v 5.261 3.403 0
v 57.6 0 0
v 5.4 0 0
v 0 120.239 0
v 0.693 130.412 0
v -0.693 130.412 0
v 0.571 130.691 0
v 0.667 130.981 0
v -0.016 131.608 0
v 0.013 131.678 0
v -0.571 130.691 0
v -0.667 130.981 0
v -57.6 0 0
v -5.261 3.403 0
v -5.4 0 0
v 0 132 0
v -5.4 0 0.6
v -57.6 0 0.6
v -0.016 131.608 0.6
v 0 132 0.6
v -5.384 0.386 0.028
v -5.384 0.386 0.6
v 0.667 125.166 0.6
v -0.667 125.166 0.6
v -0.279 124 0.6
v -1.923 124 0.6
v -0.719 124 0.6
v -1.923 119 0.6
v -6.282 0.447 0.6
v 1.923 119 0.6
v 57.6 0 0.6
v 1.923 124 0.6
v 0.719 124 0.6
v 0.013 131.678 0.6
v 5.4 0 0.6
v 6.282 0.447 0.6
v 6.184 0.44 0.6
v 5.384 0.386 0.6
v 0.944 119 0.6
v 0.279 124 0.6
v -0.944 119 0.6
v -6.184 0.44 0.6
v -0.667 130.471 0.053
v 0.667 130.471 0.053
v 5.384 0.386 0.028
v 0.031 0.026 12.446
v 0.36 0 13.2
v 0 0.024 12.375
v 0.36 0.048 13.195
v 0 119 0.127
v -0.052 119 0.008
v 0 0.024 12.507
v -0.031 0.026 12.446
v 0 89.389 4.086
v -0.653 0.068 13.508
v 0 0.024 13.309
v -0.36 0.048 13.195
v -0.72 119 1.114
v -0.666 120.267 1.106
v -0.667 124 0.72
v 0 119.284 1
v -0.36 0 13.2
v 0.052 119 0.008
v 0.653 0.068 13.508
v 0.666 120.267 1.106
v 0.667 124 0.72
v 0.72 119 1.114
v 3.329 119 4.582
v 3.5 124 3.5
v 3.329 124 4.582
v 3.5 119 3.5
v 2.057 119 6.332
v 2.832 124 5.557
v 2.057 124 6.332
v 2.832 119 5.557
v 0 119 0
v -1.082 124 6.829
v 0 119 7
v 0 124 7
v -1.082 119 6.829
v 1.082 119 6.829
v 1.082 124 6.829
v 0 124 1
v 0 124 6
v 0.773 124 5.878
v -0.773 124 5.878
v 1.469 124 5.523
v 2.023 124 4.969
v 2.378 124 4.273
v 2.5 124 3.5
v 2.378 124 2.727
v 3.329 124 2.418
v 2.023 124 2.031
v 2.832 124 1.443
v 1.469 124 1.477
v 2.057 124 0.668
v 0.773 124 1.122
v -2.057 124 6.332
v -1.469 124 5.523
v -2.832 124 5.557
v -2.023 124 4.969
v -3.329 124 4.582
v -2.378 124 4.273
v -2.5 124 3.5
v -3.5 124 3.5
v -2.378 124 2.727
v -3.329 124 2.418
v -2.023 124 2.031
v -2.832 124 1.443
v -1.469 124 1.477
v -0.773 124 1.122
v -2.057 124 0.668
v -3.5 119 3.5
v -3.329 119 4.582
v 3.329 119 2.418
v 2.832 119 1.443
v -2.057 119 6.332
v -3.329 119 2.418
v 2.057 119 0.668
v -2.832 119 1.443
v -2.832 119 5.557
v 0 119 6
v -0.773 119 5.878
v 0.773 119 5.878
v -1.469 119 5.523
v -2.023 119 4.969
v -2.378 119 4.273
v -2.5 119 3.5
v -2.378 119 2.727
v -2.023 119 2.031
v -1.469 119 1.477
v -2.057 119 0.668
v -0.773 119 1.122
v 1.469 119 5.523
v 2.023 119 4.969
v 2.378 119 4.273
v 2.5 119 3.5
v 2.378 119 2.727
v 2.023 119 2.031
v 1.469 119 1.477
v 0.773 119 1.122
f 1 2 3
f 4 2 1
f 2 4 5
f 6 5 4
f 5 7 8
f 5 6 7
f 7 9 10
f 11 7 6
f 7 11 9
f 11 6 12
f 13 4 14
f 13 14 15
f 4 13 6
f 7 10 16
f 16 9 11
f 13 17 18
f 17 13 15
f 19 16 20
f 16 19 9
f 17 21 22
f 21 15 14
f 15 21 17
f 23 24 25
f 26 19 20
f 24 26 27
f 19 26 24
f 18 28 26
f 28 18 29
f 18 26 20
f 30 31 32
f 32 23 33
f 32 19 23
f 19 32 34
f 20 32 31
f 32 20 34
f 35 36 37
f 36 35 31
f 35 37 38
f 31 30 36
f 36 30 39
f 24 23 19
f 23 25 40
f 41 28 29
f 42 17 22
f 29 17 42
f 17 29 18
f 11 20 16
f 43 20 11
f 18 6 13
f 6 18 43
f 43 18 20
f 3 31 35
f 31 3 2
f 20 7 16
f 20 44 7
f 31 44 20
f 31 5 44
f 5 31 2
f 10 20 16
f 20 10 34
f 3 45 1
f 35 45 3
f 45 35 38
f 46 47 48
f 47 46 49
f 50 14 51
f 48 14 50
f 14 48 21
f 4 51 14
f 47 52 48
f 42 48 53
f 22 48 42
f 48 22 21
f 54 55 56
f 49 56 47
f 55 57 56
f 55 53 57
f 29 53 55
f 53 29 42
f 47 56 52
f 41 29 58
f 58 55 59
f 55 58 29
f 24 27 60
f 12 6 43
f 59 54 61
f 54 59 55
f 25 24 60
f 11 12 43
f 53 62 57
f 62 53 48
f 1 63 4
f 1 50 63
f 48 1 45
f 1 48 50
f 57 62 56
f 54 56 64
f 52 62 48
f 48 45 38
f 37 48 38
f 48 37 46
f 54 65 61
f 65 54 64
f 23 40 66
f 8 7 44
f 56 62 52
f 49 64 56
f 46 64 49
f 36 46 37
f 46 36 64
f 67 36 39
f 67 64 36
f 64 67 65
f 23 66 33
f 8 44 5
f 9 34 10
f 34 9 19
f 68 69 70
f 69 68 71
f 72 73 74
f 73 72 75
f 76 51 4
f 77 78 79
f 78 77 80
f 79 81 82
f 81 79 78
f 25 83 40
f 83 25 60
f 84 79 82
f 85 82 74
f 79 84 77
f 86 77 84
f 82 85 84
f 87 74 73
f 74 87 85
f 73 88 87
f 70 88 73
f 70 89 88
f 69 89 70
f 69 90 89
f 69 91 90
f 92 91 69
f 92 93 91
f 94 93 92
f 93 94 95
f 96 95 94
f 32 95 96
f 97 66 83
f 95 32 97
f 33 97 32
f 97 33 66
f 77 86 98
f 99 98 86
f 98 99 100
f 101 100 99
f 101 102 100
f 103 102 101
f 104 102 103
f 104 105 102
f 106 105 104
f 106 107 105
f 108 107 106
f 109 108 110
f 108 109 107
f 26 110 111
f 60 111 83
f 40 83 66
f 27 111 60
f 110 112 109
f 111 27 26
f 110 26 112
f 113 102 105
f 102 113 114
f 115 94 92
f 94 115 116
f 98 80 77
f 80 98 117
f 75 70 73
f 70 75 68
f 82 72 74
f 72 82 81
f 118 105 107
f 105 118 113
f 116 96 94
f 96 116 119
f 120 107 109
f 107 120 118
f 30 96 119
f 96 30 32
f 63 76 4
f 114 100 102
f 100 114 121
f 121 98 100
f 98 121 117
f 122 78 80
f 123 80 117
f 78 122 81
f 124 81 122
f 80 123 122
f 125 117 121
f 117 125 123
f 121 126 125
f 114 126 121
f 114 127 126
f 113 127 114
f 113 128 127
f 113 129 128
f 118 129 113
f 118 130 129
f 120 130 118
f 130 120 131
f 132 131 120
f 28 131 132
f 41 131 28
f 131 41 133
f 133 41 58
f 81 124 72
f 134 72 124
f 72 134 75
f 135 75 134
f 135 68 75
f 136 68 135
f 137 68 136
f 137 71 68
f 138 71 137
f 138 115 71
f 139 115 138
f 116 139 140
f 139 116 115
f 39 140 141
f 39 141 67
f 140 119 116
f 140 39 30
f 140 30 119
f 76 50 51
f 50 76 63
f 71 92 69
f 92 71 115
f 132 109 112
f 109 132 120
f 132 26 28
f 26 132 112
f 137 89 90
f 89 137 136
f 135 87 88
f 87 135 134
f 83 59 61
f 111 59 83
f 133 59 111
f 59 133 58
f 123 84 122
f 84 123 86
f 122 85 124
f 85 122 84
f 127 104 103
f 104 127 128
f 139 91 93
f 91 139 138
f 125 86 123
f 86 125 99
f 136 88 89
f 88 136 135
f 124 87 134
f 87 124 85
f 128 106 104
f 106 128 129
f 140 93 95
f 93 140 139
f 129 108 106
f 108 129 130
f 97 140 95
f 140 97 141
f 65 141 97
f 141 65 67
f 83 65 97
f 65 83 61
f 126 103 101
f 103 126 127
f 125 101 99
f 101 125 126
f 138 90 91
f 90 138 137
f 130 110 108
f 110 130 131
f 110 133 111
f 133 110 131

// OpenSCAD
$fn = 20;

r = 32;
l = 60;
t = 0.4;

scale([1.8, 2.2, 1.5]) difference() {
    all();
    translate([0, 0, -1]) cube([200, 200, 2], true);
    
}
translate([0, 0, 3.5]) difference() {
    translate([0, 124, 0]) 
        rotate([90, 0, 0]) 
            cylinder(d = 7, h = 5);
    
    translate([0, 130, 0]) 
        rotate([90, 0, 0]) 
            cylinder(d = 5, h = 15);
}

module all() {
    wing();
    mirror([1, 0, 0]) wing();

    body();
    mirror([1, 0, 0]) body();
    
    translate([-0.1, 57, 0]) 
        rotate([0, 0, -27]) 
            scale([0.8, 1, 1]) 
                cylinder(d = 6, h = t, $fn = 3);
    
}

module wing() {
    linear_extrude(t) polygon([
        [0, 60],
        [-3, 0],
        [-r, 0]
    ]);
}

module body() {
    translate([0.2, 0, 8.8]) 
        rotate([0, -70, -3.15]) 
            linear_extrude(0.6) 
                polygon([
                    [-10, 0],
                    [-10, 62],
                    [0, 0],
                ]);
}
